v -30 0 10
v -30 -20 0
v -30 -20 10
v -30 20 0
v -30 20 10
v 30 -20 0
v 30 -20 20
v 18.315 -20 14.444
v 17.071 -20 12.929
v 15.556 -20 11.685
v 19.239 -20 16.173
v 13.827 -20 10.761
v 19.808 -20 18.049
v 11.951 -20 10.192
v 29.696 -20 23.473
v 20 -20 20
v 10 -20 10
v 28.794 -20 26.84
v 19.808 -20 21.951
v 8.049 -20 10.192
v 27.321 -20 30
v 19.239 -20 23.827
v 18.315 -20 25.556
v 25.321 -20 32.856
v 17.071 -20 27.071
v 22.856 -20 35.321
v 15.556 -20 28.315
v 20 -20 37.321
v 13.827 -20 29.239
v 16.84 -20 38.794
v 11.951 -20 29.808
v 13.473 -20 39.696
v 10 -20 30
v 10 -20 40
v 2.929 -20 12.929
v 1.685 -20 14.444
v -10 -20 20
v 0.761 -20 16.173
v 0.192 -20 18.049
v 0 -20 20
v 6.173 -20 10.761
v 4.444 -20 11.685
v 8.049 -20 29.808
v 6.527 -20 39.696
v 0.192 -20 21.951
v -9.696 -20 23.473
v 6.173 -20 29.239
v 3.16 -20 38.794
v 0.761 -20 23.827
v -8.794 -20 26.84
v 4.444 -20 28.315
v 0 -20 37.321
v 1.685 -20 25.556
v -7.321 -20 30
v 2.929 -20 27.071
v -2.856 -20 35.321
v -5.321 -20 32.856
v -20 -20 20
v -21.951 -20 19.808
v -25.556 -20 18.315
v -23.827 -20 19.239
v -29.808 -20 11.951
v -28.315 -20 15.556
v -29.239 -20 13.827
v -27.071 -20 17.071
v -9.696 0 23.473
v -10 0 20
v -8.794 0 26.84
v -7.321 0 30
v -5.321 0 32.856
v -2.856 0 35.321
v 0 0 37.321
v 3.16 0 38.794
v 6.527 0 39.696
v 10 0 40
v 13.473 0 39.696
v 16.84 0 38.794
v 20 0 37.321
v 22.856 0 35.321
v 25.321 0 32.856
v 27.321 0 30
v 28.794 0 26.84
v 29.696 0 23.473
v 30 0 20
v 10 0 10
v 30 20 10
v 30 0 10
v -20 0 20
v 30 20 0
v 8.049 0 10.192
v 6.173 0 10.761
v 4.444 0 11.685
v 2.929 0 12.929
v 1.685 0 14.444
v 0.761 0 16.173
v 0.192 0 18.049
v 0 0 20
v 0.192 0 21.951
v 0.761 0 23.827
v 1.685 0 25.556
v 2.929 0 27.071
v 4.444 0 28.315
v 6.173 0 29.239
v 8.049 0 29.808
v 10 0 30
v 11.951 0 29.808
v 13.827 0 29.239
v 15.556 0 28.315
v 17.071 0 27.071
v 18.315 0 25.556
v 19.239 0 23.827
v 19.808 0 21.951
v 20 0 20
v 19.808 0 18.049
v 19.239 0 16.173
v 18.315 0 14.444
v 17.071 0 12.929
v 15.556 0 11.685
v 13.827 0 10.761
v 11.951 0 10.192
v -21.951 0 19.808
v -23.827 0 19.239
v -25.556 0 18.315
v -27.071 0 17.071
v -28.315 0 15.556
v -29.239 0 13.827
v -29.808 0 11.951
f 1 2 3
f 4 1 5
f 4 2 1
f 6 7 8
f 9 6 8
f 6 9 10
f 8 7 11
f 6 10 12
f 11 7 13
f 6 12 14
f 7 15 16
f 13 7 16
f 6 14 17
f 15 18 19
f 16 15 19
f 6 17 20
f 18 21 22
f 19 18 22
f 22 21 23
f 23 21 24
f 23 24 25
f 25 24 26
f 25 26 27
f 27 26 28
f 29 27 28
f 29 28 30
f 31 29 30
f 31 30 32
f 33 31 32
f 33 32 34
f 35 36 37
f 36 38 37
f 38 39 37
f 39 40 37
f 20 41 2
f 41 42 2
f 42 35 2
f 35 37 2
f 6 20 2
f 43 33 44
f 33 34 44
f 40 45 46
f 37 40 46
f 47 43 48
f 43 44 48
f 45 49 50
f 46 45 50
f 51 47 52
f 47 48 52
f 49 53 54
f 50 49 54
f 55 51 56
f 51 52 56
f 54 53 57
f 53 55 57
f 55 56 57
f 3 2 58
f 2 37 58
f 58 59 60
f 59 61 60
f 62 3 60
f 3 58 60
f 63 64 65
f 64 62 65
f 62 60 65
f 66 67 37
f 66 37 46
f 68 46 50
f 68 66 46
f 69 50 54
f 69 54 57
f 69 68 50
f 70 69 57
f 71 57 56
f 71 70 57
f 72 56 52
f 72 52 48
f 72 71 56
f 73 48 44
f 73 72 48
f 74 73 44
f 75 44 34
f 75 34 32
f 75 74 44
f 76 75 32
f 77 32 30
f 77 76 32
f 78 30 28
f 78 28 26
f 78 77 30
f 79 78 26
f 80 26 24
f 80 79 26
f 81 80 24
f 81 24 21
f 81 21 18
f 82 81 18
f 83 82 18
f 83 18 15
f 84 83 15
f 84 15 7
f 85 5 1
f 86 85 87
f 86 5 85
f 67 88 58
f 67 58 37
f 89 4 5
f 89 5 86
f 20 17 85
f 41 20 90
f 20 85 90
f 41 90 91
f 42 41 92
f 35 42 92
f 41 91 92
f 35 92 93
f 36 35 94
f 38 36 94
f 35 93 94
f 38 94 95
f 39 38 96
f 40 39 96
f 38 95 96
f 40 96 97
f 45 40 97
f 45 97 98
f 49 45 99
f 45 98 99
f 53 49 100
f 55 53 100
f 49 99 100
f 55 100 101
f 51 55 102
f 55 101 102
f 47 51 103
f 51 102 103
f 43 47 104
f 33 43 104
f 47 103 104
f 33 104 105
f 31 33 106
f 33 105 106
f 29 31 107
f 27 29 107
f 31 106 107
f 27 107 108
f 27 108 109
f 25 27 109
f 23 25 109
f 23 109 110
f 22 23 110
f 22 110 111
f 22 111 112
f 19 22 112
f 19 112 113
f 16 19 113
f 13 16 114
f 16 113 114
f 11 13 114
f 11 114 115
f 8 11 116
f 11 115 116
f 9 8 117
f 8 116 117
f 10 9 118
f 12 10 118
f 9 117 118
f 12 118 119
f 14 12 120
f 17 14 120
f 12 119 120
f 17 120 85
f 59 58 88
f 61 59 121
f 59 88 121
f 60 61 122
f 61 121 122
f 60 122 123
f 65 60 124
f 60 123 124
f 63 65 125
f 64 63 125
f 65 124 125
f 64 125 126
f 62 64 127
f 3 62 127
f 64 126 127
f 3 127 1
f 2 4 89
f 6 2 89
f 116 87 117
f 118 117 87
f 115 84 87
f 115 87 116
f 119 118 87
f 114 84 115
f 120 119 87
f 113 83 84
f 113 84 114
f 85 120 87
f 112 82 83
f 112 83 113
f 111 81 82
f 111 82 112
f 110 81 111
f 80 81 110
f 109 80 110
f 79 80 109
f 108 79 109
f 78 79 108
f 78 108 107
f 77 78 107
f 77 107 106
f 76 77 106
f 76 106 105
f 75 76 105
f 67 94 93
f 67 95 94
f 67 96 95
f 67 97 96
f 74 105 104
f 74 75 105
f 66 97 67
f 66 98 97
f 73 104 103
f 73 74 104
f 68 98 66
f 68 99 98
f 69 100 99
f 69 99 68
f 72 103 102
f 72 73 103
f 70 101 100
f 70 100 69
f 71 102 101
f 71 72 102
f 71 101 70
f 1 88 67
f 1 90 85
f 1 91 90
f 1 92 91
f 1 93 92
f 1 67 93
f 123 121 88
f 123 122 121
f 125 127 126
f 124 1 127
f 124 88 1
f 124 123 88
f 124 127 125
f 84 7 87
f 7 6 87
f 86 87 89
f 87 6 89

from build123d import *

# Parameters (mm, degrees)
F0_W     = 60
F0_H     = 40
F1_DEPTH = 10
F2_W     = 60
F2_H     = 20
F3_DEPTH = 10
F5_DEPTH = 20
F6_R     = 10
F8_DEPTH = 20


with BuildPart() as f1:
    # F0 (on Top) → F1 (new body)
    with BuildSketch(Plane.XY):
        Rectangle(F0_W, F0_H)
    extrude(amount=F1_DEPTH)

    # F2 (on face) → F3 (join)
    with BuildSketch(Plane.XY.offset(10)):
        with Locations((0, -10)):
            Rectangle(F2_W, F2_H)
    extrude(amount=F3_DEPTH)

    # F4 (on face) → F5 (join)
    with BuildSketch(Plane(origin=(0, 0, 0), x_dir=(-1, 0, 0), z_dir=(0, 1, 0))):
        with BuildLine():
            Line((-30, 20), (10, 20))
            ThreePointArc((10, 20), (-10, 40), (-30, 20))
        make_face()
    extrude(amount=-F5_DEPTH)

    # F6
    f6_edges = [f1.edges().sort_by_distance(p)[0] for p in [
        (-30, -10, 20),
    ]]
    fillet(f6_edges, radius=F6_R)

    # F7 (on face) → F8 (cut)
    with BuildSketch(Plane(origin=(0, 0, 0), x_dir=(-1, 0, 0), z_dir=(0, 1, 0))):
        with BuildLine():
            ThreePointArc((-10, 10), (-2.928932, 12.928932), (0, 20))
            ThreePointArc((0, 20), (-17.071068, 27.071068), (-10, 10))
        make_face()
    extrude(amount=-F8_DEPTH, mode=Mode.SUBTRACT)


solid = f1.part
